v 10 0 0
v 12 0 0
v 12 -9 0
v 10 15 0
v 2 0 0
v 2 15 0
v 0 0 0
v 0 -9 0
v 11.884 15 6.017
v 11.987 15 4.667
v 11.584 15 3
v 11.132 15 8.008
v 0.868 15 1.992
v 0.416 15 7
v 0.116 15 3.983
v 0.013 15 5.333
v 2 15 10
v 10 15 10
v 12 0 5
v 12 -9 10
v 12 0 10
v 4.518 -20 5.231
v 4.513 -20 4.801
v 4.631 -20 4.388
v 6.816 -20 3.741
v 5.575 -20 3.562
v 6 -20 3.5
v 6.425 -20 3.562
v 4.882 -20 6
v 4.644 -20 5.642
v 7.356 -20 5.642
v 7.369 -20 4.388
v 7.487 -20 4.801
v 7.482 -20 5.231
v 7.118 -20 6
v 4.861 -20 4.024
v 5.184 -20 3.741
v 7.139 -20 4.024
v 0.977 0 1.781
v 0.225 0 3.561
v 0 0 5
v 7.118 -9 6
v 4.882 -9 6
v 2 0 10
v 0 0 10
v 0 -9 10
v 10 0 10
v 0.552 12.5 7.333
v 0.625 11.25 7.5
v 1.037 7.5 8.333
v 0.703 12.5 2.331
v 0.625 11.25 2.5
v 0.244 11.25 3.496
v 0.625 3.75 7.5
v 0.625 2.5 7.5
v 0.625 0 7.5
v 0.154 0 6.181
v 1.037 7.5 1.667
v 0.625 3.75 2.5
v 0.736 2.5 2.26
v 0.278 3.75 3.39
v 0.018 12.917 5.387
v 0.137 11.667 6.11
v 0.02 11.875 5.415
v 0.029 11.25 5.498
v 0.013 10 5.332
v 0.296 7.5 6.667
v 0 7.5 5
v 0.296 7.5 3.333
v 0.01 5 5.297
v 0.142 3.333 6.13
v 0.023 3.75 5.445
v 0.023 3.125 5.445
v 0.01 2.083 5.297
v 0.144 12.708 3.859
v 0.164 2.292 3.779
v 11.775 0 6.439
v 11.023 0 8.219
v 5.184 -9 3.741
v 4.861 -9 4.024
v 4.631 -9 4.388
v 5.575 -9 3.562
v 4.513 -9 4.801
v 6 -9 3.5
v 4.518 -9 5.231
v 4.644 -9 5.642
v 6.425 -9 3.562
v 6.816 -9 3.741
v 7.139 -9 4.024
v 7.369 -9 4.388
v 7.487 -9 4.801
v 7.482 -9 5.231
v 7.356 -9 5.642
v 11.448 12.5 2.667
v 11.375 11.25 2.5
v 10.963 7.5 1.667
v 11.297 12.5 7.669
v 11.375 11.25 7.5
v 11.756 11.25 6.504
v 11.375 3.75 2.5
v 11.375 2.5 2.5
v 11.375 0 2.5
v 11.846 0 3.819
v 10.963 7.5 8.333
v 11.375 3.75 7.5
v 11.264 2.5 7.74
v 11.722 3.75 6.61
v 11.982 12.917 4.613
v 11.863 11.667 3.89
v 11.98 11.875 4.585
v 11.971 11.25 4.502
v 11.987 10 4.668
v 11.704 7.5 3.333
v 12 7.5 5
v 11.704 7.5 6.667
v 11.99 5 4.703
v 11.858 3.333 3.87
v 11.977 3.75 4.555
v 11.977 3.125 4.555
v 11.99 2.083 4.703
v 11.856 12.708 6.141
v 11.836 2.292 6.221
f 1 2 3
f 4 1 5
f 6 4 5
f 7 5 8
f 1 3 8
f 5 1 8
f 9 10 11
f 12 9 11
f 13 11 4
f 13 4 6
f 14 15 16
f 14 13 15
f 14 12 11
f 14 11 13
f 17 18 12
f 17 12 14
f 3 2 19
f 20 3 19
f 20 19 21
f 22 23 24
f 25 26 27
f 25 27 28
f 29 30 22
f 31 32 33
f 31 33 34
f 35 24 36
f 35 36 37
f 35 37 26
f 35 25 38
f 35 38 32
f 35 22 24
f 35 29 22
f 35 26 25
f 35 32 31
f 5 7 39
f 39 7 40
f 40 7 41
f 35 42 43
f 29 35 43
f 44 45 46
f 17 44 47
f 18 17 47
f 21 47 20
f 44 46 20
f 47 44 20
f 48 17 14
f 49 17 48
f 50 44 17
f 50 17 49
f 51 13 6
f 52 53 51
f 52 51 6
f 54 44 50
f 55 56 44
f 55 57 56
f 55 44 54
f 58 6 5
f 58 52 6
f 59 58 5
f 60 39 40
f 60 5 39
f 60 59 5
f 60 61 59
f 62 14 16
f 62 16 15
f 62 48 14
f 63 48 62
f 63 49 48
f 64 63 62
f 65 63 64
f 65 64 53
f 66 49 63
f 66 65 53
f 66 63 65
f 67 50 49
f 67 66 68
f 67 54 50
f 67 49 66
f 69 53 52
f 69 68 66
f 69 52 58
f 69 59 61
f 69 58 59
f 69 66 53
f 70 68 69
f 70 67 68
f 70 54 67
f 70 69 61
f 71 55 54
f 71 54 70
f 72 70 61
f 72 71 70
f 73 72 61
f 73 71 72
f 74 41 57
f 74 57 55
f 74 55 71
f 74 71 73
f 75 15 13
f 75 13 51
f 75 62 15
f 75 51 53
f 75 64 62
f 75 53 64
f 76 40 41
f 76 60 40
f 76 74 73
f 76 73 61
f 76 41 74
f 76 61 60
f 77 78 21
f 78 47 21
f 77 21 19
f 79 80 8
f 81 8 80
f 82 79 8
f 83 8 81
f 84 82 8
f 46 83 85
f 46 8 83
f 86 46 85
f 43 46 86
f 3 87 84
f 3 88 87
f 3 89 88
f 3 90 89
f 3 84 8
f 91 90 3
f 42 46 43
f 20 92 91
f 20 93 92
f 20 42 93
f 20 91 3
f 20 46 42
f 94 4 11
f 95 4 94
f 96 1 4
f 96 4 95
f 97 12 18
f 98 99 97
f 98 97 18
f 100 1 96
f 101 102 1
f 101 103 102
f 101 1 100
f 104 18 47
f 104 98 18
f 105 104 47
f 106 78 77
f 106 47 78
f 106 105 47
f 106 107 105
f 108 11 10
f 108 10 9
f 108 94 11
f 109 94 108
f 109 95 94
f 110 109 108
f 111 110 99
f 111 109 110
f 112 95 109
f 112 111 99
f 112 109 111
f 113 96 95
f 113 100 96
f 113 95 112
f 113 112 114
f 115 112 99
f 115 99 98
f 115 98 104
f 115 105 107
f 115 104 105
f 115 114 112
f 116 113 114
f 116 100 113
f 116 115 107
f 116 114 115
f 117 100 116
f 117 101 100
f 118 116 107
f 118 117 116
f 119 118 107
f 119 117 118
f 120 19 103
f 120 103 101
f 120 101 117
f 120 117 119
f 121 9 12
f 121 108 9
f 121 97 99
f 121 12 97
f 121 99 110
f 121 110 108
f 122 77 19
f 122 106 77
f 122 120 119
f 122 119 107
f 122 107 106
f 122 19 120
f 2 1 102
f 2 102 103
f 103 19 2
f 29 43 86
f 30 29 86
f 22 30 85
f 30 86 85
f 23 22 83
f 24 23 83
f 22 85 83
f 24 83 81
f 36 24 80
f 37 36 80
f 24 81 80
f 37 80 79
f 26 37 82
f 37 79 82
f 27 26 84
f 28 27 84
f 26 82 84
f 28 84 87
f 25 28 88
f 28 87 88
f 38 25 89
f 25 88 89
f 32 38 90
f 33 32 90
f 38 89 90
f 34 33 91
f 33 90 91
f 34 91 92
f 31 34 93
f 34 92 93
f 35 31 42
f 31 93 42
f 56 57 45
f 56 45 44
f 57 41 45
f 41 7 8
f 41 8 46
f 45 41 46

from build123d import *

# Parameters (mm, degrees)
F0_W     = 12
F0_H     = 10
F1_DEPTH = 9
F3_DEPTH = 15
F5_DEPTH = 11


with BuildPart() as f1:
    # F0 (on Front) → F1 (new body)
    with BuildSketch(Plane.XZ):
        with Locations((6, 5)):
            Rectangle(F0_W, F0_H)
    extrude(amount=F1_DEPTH)

    # F2 (on face) → F3 (join)
    with BuildSketch(Plane(origin=(0, 0, 0), x_dir=(-1, 0, 0), z_dir=(0, 1, 0))):
        with BuildLine():
            Line((-2, 10), (-10, 10))
            add(Edge.make_bspline(
                [(-12, 5), (-12, 6.6666666667), (-11, 8.3333333333), (-10, 10)],
                knots=[0.5, 0.5, 0.5, 0.5, 1, 1, 1, 1], degree=3))
            add(Edge.make_bspline(
                [(-10, 0), (-11, 1.6666666667), (-12, 3.3333333333), (-12, 5)],
                knots=[0, 0, 0, 0, 0.5, 0.5, 0.5, 0.5], degree=3))
            Line((-10, 0), (-2, 0))
            add(Edge.make_bspline(
                [(0, 5), (0, 3.3333333333), (-1, 1.6666666667), (-2, 0)],
                knots=[0.5, 0.5, 0.5, 0.5, 1, 1, 1, 1], degree=3))
            add(Edge.make_bspline(
                [(-2, 10), (-1, 8.3333333333), (0, 6.6666666667), (0, 5)],
                knots=[0, 0, 0, 0, 0.5, 0.5, 0.5, 0.5], degree=3))
        make_face()
    extrude(amount=F3_DEPTH)

    # F4 (on face) → F5 (join)
    with BuildSketch(Plane.XZ.offset(9)):
        with BuildLine():
            Line((6, 6), (4.8819660113, 6))
            ThreePointArc((4.8819660113, 6), (6, 3.5), (7.1180339887, 6))
            Line((7.1180339887, 6), (6, 6))
        make_face()
    extrude(amount=F5_DEPTH)


solid = f1.part
